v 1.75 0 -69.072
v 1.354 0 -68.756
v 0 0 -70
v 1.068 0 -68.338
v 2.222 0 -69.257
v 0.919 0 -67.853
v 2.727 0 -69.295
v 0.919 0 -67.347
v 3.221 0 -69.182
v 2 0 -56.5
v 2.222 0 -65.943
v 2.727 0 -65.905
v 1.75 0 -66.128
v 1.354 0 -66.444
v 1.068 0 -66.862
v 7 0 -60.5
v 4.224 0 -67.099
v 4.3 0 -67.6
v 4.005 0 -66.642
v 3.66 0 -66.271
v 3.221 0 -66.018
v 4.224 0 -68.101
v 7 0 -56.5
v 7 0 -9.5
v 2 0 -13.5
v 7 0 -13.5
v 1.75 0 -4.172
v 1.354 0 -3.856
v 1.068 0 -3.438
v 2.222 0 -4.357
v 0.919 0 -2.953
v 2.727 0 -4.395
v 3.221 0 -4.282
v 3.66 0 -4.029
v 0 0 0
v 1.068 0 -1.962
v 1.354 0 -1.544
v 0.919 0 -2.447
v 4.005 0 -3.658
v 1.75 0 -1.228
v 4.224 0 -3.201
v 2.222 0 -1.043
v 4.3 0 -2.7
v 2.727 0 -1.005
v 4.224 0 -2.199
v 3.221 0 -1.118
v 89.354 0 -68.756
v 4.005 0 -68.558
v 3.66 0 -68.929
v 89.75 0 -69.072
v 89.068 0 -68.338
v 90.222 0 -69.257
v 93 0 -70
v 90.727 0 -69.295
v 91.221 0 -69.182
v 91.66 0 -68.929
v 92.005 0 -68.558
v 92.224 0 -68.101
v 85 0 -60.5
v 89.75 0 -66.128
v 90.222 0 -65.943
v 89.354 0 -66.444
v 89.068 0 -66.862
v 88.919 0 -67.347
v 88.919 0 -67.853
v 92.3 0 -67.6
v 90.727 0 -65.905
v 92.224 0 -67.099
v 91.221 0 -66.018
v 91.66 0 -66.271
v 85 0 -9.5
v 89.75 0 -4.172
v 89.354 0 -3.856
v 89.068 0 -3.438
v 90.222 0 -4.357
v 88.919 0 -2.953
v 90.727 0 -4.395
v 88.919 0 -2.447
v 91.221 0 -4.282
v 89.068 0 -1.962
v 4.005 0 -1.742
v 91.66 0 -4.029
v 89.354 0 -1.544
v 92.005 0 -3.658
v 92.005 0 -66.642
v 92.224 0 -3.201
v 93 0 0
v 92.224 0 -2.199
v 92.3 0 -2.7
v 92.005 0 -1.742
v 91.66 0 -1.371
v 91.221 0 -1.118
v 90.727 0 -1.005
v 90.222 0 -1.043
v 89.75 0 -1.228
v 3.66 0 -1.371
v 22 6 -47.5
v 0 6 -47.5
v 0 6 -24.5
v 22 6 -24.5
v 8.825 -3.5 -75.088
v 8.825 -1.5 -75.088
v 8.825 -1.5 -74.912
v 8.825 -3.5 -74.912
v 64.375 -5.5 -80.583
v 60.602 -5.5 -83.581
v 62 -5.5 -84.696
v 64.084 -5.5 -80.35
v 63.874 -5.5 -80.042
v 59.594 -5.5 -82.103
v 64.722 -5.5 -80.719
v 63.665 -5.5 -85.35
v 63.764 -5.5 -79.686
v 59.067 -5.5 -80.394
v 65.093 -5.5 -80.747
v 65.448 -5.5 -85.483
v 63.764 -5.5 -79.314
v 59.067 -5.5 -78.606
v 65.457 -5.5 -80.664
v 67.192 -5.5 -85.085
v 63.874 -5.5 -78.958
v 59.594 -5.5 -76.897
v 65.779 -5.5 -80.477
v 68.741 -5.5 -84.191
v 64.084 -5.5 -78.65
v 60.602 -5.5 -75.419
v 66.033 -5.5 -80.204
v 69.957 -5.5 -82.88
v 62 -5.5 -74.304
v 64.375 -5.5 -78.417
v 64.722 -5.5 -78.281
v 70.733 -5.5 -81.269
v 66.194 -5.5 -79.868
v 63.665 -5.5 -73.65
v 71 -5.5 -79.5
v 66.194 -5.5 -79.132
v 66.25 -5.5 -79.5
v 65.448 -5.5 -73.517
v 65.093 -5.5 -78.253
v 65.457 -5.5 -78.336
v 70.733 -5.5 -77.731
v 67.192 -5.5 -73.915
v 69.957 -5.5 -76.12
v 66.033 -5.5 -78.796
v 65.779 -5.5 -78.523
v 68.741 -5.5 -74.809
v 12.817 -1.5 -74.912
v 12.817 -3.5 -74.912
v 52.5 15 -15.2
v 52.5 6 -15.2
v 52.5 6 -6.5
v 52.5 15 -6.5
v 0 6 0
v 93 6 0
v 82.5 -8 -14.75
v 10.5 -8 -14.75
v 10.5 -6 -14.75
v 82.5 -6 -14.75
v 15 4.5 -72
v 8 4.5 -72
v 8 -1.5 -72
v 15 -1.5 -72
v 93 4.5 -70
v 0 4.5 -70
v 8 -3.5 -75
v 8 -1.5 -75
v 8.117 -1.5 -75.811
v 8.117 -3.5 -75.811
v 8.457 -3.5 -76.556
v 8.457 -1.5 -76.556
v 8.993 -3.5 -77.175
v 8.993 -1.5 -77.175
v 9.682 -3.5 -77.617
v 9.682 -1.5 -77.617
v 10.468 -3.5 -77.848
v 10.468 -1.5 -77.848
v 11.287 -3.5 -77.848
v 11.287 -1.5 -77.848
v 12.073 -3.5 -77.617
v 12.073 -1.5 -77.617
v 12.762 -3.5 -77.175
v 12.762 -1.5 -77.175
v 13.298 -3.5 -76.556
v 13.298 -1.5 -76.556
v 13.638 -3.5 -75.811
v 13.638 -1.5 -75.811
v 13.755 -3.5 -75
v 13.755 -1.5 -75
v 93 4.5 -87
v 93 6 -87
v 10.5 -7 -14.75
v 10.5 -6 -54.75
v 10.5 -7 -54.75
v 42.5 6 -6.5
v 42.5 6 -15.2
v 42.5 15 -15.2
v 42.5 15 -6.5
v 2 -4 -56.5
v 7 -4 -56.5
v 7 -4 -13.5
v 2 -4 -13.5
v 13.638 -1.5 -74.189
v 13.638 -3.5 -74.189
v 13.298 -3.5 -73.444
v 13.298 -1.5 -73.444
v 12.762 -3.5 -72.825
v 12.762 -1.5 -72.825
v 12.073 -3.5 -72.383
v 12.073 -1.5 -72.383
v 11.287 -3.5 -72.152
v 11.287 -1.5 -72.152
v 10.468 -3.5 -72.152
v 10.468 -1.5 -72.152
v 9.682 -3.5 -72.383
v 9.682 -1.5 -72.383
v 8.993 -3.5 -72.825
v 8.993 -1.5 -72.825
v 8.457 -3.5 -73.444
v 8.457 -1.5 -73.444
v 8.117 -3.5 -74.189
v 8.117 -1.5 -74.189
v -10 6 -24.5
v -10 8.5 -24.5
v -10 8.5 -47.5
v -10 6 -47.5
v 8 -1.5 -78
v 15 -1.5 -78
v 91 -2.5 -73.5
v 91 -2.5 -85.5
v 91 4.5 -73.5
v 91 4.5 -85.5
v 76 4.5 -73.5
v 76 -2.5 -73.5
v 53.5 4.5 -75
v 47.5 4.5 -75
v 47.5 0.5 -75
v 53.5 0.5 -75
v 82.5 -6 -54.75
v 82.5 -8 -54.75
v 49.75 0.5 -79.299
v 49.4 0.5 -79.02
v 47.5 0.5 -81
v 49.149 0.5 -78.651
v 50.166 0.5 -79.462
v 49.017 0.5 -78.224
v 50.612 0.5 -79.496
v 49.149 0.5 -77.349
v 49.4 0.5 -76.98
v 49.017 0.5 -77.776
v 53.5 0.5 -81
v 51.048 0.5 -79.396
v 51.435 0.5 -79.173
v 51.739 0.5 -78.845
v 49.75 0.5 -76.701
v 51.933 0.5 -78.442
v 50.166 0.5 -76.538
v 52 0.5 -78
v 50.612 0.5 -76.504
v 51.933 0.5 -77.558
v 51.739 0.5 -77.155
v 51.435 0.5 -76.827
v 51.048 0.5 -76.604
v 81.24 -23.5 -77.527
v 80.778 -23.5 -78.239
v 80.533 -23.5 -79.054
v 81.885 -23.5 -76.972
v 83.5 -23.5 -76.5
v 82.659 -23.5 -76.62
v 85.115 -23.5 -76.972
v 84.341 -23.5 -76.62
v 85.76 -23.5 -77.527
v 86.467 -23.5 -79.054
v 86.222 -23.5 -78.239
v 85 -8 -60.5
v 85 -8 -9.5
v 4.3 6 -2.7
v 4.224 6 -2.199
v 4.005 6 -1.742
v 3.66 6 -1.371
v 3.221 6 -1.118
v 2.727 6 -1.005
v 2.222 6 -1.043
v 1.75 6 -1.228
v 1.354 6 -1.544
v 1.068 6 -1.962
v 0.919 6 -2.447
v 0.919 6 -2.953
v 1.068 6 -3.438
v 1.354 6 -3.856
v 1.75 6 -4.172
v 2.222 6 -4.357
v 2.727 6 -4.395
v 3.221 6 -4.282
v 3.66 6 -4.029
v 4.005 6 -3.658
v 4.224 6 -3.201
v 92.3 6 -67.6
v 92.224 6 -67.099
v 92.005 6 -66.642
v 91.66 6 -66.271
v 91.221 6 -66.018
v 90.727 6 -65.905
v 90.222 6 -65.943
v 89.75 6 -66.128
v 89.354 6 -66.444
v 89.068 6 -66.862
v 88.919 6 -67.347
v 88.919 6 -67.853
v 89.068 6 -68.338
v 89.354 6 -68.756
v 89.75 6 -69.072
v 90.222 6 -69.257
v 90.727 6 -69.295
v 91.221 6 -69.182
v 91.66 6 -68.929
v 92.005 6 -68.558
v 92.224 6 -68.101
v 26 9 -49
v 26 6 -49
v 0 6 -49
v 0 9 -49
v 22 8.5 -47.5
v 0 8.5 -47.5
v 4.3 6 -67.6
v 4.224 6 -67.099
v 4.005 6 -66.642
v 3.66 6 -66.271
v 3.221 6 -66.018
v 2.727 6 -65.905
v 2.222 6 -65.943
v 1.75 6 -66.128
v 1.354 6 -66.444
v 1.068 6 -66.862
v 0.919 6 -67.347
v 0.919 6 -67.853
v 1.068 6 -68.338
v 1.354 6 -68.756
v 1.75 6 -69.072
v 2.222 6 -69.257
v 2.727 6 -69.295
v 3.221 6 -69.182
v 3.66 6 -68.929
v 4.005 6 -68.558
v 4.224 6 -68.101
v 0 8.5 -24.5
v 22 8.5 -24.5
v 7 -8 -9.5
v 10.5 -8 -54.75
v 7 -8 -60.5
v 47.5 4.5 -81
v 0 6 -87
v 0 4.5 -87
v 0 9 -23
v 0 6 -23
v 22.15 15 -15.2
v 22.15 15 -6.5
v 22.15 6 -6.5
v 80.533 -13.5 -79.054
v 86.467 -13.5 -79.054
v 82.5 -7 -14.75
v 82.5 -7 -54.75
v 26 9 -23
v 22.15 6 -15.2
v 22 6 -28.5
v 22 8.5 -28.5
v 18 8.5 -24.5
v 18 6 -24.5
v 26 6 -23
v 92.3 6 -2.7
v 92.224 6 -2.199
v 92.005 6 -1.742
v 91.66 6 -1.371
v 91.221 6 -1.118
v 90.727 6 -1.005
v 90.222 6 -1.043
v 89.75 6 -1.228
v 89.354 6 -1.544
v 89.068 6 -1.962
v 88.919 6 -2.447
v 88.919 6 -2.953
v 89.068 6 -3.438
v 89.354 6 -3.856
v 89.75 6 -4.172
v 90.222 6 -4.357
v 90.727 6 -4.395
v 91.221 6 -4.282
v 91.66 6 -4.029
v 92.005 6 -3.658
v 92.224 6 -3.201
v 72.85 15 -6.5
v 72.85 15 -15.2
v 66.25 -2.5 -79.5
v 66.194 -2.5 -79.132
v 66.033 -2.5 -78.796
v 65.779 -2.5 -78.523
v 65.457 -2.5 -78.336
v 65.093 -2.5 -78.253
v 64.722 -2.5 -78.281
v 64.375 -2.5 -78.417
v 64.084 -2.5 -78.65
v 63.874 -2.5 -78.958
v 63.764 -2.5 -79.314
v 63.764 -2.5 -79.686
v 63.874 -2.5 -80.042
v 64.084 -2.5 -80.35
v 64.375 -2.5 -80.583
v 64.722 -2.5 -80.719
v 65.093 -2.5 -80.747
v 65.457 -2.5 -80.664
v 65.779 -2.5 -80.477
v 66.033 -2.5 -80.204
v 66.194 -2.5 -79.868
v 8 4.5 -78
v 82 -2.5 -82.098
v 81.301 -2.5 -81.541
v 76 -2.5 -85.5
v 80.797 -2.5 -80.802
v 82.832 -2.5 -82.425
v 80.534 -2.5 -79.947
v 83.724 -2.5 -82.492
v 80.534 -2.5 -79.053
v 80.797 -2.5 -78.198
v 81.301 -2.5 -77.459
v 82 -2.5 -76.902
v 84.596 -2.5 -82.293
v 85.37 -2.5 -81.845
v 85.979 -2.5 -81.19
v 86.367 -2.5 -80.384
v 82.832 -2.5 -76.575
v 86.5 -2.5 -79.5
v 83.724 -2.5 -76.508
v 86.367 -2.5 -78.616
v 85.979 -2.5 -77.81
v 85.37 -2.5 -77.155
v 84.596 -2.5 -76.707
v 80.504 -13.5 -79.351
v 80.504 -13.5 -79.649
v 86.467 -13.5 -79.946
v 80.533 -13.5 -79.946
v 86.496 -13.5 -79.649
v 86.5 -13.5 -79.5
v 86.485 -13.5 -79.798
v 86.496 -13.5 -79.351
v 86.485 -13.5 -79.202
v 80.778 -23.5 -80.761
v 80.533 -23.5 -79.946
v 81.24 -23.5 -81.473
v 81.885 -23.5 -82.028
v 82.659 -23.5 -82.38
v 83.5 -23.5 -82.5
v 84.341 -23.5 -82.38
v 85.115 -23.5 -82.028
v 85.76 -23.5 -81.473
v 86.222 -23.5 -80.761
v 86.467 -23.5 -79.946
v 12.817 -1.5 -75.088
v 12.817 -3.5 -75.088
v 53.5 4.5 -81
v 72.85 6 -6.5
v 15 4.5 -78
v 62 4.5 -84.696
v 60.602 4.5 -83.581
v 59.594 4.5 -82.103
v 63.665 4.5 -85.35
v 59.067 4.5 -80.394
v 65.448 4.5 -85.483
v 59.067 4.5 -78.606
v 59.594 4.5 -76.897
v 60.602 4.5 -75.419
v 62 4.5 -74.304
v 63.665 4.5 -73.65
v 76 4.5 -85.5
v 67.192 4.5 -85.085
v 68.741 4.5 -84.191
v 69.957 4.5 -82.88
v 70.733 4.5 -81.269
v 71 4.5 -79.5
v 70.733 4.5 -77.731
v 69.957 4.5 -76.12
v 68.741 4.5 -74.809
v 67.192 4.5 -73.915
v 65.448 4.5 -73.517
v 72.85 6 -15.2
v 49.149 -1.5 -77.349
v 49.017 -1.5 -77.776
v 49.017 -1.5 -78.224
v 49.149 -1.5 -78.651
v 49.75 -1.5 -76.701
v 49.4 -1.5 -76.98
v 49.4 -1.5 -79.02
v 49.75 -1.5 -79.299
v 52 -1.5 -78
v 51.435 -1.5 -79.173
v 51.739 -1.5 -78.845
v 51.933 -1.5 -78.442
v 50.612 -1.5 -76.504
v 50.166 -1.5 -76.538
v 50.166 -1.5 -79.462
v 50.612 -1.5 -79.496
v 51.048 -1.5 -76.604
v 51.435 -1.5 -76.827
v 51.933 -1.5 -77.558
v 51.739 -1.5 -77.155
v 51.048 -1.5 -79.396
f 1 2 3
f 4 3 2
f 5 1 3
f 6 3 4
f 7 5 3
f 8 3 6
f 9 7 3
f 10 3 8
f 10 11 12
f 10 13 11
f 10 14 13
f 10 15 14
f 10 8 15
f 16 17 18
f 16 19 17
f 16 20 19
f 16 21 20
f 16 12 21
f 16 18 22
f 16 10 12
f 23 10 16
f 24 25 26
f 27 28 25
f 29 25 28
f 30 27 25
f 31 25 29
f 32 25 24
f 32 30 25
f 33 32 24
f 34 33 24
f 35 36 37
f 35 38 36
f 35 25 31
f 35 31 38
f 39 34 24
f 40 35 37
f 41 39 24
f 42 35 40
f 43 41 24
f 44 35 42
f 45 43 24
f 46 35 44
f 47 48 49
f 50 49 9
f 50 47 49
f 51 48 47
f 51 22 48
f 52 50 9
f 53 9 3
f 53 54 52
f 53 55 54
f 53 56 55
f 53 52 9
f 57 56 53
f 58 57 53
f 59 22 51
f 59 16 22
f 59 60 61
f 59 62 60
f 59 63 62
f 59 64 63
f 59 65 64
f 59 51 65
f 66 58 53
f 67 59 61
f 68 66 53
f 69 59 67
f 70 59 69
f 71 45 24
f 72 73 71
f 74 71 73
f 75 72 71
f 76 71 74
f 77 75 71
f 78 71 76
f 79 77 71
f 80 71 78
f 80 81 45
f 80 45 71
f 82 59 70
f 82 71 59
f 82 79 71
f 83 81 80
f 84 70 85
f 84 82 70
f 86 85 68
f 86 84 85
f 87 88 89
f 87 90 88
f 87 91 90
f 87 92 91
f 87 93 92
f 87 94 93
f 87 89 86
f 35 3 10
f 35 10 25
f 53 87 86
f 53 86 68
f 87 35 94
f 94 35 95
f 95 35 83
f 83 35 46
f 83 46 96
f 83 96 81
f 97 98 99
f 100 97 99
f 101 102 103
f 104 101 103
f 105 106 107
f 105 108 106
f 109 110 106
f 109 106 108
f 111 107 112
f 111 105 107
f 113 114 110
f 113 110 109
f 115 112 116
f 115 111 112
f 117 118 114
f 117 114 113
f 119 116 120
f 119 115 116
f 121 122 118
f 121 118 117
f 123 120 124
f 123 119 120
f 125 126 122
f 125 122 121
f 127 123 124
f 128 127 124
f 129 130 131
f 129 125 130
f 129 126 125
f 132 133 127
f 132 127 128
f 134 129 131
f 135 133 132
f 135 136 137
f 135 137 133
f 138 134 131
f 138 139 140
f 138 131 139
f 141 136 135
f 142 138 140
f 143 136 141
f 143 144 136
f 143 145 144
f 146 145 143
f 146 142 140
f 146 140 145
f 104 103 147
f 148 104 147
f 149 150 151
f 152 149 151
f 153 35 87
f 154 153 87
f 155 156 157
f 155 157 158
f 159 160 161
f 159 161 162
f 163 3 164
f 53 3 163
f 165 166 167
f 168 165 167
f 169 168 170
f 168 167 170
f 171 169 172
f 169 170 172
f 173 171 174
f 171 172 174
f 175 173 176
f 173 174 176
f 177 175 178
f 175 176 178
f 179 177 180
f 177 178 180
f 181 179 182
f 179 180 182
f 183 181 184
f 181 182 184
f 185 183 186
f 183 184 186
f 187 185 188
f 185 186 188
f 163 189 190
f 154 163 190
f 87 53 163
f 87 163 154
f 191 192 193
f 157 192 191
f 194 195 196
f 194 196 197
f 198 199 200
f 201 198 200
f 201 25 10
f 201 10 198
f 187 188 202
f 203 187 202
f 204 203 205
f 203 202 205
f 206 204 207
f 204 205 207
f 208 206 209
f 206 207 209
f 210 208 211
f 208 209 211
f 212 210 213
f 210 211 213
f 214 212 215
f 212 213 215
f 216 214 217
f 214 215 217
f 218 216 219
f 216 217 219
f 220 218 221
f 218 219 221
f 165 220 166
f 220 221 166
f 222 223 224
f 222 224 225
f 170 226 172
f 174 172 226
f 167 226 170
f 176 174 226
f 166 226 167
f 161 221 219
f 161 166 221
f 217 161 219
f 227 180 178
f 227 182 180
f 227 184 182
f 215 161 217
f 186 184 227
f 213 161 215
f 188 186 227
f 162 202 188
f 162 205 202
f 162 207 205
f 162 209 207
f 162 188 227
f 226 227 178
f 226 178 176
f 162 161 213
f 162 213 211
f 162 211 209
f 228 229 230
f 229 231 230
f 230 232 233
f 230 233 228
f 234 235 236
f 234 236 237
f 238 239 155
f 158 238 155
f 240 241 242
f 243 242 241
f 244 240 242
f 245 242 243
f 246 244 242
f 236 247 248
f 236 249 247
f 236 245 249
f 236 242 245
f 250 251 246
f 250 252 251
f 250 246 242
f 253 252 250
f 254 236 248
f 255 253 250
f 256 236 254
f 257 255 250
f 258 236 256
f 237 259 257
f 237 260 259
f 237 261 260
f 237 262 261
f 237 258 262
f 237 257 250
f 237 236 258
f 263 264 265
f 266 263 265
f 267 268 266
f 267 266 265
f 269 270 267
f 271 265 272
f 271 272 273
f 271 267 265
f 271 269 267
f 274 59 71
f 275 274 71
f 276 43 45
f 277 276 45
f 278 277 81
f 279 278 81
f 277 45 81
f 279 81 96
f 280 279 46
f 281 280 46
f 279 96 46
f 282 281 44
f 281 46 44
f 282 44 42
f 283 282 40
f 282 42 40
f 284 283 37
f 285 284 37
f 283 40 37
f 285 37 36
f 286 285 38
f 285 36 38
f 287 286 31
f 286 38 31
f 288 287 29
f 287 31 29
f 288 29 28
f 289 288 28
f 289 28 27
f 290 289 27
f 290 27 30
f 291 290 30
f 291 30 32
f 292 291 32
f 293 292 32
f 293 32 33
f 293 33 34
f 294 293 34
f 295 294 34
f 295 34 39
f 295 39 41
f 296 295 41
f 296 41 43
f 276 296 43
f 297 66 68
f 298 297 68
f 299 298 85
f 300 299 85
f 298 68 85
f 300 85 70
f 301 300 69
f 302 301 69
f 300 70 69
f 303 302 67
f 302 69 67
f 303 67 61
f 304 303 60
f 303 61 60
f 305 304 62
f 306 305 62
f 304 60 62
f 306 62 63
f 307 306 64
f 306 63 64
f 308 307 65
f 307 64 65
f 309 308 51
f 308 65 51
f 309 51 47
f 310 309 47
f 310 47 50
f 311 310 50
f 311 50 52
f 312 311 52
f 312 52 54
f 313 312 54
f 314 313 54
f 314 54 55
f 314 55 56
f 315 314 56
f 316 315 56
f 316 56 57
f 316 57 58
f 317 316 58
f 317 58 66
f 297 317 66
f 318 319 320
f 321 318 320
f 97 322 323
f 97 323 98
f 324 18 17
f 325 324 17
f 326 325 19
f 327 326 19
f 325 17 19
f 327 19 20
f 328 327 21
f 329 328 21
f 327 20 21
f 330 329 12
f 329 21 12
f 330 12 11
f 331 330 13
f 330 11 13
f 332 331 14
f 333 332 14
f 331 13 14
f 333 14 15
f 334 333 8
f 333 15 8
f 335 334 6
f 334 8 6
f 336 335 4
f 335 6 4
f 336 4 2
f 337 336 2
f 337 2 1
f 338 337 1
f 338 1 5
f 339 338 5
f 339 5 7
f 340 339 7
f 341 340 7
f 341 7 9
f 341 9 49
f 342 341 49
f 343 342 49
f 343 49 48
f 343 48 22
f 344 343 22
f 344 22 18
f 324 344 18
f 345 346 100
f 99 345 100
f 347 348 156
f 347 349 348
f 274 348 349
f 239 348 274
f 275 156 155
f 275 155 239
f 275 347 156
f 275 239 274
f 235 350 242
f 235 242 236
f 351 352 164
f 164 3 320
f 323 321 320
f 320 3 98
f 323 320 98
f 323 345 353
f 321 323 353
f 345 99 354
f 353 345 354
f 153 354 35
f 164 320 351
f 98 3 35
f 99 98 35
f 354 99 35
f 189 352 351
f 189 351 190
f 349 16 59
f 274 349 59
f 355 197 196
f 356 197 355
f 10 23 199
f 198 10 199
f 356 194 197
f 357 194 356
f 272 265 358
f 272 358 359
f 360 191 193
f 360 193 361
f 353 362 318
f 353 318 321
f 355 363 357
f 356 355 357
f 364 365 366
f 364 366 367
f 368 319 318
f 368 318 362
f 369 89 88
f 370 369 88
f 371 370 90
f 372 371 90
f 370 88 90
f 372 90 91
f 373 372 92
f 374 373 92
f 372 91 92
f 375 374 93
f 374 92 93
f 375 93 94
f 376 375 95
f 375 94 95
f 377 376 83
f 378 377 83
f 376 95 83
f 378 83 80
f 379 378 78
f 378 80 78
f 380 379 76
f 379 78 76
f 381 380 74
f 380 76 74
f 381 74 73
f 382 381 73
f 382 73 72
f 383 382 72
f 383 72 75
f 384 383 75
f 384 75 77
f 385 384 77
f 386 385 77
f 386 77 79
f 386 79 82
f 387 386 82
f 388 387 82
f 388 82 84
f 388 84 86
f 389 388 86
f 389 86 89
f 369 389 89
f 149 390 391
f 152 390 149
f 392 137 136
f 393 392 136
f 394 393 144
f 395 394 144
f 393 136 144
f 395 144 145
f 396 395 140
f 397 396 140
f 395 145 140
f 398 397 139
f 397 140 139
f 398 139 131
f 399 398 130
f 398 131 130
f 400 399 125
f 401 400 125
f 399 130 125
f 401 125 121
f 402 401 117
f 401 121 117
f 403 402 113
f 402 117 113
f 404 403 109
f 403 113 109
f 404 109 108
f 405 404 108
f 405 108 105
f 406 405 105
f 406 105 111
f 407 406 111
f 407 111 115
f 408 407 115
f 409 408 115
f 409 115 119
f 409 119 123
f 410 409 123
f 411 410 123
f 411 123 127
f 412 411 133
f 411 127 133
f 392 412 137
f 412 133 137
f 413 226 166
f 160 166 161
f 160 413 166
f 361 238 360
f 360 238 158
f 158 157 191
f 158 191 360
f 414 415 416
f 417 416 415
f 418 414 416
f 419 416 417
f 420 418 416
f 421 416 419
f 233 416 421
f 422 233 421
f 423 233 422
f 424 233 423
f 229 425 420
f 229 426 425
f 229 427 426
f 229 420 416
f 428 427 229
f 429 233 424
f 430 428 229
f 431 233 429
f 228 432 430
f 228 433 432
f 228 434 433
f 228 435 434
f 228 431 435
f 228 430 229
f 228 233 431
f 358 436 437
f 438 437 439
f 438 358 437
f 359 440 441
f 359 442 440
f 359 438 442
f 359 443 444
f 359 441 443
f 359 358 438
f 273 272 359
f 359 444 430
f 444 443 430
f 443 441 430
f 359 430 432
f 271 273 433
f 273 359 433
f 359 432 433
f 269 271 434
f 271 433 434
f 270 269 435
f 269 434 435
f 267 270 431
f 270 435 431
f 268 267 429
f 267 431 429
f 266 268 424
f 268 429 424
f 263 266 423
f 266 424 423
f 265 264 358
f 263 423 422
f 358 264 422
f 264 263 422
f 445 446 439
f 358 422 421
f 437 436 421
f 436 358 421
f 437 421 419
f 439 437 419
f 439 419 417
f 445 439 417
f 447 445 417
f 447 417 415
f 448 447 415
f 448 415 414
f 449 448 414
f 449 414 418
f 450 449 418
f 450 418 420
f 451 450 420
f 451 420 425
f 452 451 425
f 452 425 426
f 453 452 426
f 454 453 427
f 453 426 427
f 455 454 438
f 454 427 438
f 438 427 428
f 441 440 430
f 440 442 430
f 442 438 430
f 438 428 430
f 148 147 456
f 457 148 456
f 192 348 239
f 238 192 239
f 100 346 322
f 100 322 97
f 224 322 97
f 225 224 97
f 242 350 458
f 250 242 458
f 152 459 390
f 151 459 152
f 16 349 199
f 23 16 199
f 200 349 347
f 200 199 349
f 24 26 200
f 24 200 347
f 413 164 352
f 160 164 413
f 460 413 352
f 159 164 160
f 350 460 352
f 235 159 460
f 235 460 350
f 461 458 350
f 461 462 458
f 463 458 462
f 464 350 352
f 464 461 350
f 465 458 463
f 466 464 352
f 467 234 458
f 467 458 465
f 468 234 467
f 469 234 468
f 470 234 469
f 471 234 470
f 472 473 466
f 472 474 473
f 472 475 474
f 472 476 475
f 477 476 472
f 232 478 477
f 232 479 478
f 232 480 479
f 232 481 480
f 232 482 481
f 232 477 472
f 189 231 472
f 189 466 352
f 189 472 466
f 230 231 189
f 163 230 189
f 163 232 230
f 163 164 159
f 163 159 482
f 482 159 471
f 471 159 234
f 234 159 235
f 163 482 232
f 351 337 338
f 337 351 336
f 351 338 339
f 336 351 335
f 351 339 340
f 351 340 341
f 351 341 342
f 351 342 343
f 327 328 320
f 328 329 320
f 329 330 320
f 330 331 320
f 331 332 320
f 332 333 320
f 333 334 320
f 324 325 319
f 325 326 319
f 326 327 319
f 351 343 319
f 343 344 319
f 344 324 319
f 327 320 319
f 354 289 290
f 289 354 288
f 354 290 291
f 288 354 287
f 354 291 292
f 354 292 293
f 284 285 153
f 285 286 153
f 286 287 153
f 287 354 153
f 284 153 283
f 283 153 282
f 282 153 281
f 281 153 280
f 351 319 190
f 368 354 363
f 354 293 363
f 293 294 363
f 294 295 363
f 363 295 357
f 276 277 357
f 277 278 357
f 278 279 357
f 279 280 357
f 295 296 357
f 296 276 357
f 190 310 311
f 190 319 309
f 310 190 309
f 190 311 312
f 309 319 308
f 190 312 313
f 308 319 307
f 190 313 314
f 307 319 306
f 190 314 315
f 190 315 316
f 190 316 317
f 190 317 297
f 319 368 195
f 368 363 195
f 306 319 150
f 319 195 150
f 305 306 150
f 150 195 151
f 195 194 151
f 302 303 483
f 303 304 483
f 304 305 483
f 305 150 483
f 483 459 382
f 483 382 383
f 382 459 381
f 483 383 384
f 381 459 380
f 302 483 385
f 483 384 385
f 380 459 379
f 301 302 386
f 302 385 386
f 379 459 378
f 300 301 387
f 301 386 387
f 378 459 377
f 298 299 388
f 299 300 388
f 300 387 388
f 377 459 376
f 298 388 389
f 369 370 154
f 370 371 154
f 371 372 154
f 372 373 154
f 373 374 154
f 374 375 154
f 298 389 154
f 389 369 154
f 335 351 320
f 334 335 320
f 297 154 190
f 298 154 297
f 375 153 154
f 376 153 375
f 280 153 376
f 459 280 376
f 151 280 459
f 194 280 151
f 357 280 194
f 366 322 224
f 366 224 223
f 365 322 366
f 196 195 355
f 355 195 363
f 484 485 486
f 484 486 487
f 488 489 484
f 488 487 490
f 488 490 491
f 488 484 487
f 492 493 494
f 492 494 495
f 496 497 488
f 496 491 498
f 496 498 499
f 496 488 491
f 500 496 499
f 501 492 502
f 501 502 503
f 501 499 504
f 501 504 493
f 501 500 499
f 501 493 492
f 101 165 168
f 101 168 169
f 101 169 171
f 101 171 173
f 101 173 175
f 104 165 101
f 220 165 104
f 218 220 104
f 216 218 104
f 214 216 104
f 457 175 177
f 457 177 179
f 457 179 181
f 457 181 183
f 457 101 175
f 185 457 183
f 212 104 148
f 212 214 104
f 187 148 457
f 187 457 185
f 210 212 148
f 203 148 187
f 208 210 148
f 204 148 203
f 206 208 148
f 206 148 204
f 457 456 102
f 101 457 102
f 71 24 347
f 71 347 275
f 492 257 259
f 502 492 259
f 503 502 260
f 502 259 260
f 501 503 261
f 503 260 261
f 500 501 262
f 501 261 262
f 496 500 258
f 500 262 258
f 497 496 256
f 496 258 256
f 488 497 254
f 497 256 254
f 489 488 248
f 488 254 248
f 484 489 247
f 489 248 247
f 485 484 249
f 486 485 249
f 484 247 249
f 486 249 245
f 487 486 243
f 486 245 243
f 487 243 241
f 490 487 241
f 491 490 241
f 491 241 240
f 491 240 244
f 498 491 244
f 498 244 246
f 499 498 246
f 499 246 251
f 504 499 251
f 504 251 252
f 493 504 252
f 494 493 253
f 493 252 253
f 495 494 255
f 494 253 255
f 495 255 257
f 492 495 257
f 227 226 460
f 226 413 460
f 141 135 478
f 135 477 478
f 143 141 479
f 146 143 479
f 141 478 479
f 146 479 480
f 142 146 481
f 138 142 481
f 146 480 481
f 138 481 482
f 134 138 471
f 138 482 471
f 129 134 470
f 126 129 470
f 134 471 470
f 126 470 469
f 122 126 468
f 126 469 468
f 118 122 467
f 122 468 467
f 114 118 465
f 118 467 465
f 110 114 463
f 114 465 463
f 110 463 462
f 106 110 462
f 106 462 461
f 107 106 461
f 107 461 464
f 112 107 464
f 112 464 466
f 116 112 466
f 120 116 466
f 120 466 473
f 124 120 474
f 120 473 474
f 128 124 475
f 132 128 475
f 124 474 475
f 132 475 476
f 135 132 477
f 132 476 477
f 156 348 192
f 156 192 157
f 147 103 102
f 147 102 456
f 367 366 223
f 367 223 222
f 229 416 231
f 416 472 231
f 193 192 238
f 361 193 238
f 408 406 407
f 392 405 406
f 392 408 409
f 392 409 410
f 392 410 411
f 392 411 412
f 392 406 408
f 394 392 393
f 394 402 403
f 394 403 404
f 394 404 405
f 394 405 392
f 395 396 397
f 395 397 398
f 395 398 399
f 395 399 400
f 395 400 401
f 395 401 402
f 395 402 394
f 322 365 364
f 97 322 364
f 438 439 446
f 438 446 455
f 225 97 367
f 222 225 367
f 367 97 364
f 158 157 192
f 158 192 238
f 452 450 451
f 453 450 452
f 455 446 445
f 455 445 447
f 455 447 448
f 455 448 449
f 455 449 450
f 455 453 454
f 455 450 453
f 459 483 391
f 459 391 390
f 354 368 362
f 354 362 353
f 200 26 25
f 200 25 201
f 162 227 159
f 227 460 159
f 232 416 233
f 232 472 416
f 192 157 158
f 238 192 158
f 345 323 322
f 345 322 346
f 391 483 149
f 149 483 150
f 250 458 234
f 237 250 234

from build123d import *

# Parameters (mm, degrees)
F0_W      = 93
F0_H      = 87
F1_DEPTH  = 6
F2_W      = 78
F2_H      = 51
F3_DEPTH  = 8
F4_W      = 72
F4_H      = 40
F5_DEPTH  = 2
F6_R      = 1.7
F7_DEPTH  = 25
F8_W      = 4
F8_H      = 43
F9_DEPTH  = 5
F10_W     = 93
F10_H     = 17
F11_DEPTH = 4.5
F12_W     = 15
F12_H     = 12
F12_W_2   = 6
F12_H_2   = 6
F12_W_3   = 7
F12_R     = 6
F13_DEPTH = 4
F14_DEPTH = 3
F15_DEPTH = 2
F16_DEPTH = 6
F18_DEPTH = 2
F19_R     = 1.5
F20_DEPTH = 2
F21_R     = 1.25
F22_DEPTH = 3
F23_R     = 3
F24_DEPTH = 21
F25_W     = 6.7849671841
F25_H     = 0.8927487135
F26_DEPTH = 10
F27_W     = 26
F27_H     = 26
F28_DEPTH = 3
F29_W     = 2.5
F29_H     = 23
F30_DEPTH = 22
F31_DEPTH = 32
F32_SIZE  = 4
F33_W     = 20.35
F33_H     = 8.7
F34_DEPTH = 9
F35_DEPTH = 1


with BuildPart() as f1:
    # F0 (on Front) → F1 (new body)
    with BuildSketch(Plane.XZ):
        with Locations((46.5, -43.5)):
            Rectangle(F0_W, F0_H)
    extrude(amount=-F1_DEPTH)

    # F2 (on face) → F3 (join)
    with BuildSketch(Plane.XZ):
        with Locations((46, -35)):
            Rectangle(F2_W, F2_H)
    extrude(amount=F3_DEPTH)

    # F4 (on face) → F5 (cut)
    with BuildSketch(Plane.XZ.offset(8)):
        with Locations((46.5, -34.75)):
            Rectangle(F4_W, F4_H)
    extrude(amount=-F5_DEPTH, mode=Mode.SUBTRACT)

    # F6 (on face) → F7 (cut)
    with BuildSketch(Plane.XZ):
        with Locations((2.6, -2.7)):
            Circle(F6_R)
        with Locations((90.6, -2.7)):
            Circle(F6_R)
        with Locations((90.6, -67.6)):
            Circle(F6_R)
        with Locations((2.6, -67.6)):
            Circle(F6_R)
    extrude(amount=-F7_DEPTH, mode=Mode.SUBTRACT)

    # F8 (on face) → F9 (join)
    with BuildSketch(Plane(origin=(7, 0, 0), x_dir=(0, -1, 0), z_dir=(-1, 0, 0))):
        with Locations((2, -35)):
            Rectangle(F8_W, F8_H)
    extrude(amount=F9_DEPTH)

    # F10 (on face) → F11 (cut)
    with BuildSketch(Plane.XZ):
        with Locations((46.5, -78.5)):
            Rectangle(F10_W, F10_H)
    extrude(amount=-F11_DEPTH, mode=Mode.SUBTRACT)

    # F12 (on face) → F13 (join)
    with BuildSketch(Plane.XZ.offset(-4.5)):
        with Locations((83.5, -79.5)):
            Rectangle(F12_W, F12_H)
        with Locations((50.5, -78)):
            Rectangle(F12_W_2, F12_H_2)
        with Locations((11.5, -75)):
            Rectangle(F12_W_3, F12_H_2)
        with Locations((65, -79.5)):
            Circle(F12_R)
    extrude(amount=F13_DEPTH)

    # F14 (add): a face of the model
    f14_faces = [f1.faces().sort_by_distance(p)[0] for p in [
        (83.5, 0.5, -79.5),
    ]]
    extrude(f14_faces, amount=F14_DEPTH)

    # F15 (add): a face of the model
    f15_faces = [f1.faces().sort_by_distance(p)[0] for p in [
        (11.5, 0.5, -75),
    ]]
    extrude(f15_faces, amount=F15_DEPTH)

    # F16 (add): a face of the model
    f16_faces = [f1.faces().sort_by_distance(p)[0] for p in [
        (65, 0.5, -79.5),
    ]]
    extrude(f16_faces, amount=F16_DEPTH)

    # F17 (on face) → F18 (join)
    with BuildSketch(Plane.XZ.offset(1.5)):
        with BuildLine():
            ThreePointArc((8, -75), (10.8774275169, -77.8774275169), (13.7548550337, -75))
            ThreePointArc((13.7548550337, -75), (10.8774275169, -72.1225724831), (8, -75))
        make_face()
        Polygon((8.8251130655, -75), (8.8251130655, -74.9121382833), (12.8170177341, -74.9121382833), (12.8170177341, -75), (12.8170177341, -75.0878617167), (8.8251130655, -75.0878617167), align=None, mode=Mode.SUBTRACT)
    extrude(amount=F18_DEPTH)

    # F19 (on face) → F20 (join)
    with BuildSketch(Plane.XZ.offset(-0.5)):
        with Locations((50.5, -78)):
            Circle(F19_R)
    extrude(amount=F20_DEPTH)

    # F21 (on face) → F22 (cut)
    with BuildSketch(Plane.XZ.offset(5.5)):
        with Locations((65, -79.5)):
            Circle(F21_R)
    extrude(amount=-F22_DEPTH, mode=Mode.SUBTRACT)

    # F23 (on face) → F24 (join)
    with BuildSketch(Plane.XZ.offset(2.5)):
        with Locations((83.5, -79.5)):
            Circle(F23_R)
    extrude(amount=F24_DEPTH)

    # F25 (on face) → F26 (cut)
    with BuildSketch(Plane.XZ.offset(23.5)):
        with Locations((83.5, -79.5)):
            Rectangle(F25_W, F25_H)
    extrude(amount=-F26_DEPTH, mode=Mode.SUBTRACT)

    # F27 (on face) → F28 (join)
    with BuildSketch(Plane(origin=(0, 6, 0), x_dir=(-1, 0, 0), z_dir=(0, 1, 0))):
        with Locations((-13, -36)):
            Rectangle(F27_W, F27_H)
    extrude(amount=F28_DEPTH)

    # F29 (on face) → F30 (cut)
    with BuildSketch(Plane(origin=(0, 0, 0), x_dir=(0, -1, 0), z_dir=(-1, 0, 0))):
        with Locations((-7.25, -36)):
            Rectangle(F29_W, F29_H)
    extrude(amount=-F30_DEPTH, mode=Mode.SUBTRACT)


with BuildPart() as f31:
    # F31 (new): a face of the model
    f31_faces = [f1.part.faces().sort_by_distance(p)[0] for p in [
        (22, 7.25, -36),
    ]]
    extrude(f31_faces, amount=F31_DEPTH)

    # F32
    f32_edges = [f31.edges().sort_by_distance(p)[0] for p in [
        (22, 7.25, -24.5),
    ]]
    chamfer(f32_edges, length=F32_SIZE)


with BuildPart() as f1_1:
    add(f1.part)

    # F33 (on face) → F34 (join)
    with BuildSketch(Plane(origin=(0, 6, 0), x_dir=(-1, 0, 0), z_dir=(0, 1, 0))):
        with Locations((-62.675, -10.85)):
            Rectangle(F33_W, F33_H)
        with Locations((-32.325, -10.85)):
            Rectangle(F33_W, F33_H)
    extrude(amount=F34_DEPTH)


with BuildPart() as f35:
    # F35 (new): a face of the model
    f35_faces = [f1_1.part.faces().sort_by_distance(p)[0] for p in [
        (46.5, -6, -34.75),
    ]]
    extrude(f35_faces, amount=F35_DEPTH)


solid = Compound([f31.part, f1_1.part, f35.part])
